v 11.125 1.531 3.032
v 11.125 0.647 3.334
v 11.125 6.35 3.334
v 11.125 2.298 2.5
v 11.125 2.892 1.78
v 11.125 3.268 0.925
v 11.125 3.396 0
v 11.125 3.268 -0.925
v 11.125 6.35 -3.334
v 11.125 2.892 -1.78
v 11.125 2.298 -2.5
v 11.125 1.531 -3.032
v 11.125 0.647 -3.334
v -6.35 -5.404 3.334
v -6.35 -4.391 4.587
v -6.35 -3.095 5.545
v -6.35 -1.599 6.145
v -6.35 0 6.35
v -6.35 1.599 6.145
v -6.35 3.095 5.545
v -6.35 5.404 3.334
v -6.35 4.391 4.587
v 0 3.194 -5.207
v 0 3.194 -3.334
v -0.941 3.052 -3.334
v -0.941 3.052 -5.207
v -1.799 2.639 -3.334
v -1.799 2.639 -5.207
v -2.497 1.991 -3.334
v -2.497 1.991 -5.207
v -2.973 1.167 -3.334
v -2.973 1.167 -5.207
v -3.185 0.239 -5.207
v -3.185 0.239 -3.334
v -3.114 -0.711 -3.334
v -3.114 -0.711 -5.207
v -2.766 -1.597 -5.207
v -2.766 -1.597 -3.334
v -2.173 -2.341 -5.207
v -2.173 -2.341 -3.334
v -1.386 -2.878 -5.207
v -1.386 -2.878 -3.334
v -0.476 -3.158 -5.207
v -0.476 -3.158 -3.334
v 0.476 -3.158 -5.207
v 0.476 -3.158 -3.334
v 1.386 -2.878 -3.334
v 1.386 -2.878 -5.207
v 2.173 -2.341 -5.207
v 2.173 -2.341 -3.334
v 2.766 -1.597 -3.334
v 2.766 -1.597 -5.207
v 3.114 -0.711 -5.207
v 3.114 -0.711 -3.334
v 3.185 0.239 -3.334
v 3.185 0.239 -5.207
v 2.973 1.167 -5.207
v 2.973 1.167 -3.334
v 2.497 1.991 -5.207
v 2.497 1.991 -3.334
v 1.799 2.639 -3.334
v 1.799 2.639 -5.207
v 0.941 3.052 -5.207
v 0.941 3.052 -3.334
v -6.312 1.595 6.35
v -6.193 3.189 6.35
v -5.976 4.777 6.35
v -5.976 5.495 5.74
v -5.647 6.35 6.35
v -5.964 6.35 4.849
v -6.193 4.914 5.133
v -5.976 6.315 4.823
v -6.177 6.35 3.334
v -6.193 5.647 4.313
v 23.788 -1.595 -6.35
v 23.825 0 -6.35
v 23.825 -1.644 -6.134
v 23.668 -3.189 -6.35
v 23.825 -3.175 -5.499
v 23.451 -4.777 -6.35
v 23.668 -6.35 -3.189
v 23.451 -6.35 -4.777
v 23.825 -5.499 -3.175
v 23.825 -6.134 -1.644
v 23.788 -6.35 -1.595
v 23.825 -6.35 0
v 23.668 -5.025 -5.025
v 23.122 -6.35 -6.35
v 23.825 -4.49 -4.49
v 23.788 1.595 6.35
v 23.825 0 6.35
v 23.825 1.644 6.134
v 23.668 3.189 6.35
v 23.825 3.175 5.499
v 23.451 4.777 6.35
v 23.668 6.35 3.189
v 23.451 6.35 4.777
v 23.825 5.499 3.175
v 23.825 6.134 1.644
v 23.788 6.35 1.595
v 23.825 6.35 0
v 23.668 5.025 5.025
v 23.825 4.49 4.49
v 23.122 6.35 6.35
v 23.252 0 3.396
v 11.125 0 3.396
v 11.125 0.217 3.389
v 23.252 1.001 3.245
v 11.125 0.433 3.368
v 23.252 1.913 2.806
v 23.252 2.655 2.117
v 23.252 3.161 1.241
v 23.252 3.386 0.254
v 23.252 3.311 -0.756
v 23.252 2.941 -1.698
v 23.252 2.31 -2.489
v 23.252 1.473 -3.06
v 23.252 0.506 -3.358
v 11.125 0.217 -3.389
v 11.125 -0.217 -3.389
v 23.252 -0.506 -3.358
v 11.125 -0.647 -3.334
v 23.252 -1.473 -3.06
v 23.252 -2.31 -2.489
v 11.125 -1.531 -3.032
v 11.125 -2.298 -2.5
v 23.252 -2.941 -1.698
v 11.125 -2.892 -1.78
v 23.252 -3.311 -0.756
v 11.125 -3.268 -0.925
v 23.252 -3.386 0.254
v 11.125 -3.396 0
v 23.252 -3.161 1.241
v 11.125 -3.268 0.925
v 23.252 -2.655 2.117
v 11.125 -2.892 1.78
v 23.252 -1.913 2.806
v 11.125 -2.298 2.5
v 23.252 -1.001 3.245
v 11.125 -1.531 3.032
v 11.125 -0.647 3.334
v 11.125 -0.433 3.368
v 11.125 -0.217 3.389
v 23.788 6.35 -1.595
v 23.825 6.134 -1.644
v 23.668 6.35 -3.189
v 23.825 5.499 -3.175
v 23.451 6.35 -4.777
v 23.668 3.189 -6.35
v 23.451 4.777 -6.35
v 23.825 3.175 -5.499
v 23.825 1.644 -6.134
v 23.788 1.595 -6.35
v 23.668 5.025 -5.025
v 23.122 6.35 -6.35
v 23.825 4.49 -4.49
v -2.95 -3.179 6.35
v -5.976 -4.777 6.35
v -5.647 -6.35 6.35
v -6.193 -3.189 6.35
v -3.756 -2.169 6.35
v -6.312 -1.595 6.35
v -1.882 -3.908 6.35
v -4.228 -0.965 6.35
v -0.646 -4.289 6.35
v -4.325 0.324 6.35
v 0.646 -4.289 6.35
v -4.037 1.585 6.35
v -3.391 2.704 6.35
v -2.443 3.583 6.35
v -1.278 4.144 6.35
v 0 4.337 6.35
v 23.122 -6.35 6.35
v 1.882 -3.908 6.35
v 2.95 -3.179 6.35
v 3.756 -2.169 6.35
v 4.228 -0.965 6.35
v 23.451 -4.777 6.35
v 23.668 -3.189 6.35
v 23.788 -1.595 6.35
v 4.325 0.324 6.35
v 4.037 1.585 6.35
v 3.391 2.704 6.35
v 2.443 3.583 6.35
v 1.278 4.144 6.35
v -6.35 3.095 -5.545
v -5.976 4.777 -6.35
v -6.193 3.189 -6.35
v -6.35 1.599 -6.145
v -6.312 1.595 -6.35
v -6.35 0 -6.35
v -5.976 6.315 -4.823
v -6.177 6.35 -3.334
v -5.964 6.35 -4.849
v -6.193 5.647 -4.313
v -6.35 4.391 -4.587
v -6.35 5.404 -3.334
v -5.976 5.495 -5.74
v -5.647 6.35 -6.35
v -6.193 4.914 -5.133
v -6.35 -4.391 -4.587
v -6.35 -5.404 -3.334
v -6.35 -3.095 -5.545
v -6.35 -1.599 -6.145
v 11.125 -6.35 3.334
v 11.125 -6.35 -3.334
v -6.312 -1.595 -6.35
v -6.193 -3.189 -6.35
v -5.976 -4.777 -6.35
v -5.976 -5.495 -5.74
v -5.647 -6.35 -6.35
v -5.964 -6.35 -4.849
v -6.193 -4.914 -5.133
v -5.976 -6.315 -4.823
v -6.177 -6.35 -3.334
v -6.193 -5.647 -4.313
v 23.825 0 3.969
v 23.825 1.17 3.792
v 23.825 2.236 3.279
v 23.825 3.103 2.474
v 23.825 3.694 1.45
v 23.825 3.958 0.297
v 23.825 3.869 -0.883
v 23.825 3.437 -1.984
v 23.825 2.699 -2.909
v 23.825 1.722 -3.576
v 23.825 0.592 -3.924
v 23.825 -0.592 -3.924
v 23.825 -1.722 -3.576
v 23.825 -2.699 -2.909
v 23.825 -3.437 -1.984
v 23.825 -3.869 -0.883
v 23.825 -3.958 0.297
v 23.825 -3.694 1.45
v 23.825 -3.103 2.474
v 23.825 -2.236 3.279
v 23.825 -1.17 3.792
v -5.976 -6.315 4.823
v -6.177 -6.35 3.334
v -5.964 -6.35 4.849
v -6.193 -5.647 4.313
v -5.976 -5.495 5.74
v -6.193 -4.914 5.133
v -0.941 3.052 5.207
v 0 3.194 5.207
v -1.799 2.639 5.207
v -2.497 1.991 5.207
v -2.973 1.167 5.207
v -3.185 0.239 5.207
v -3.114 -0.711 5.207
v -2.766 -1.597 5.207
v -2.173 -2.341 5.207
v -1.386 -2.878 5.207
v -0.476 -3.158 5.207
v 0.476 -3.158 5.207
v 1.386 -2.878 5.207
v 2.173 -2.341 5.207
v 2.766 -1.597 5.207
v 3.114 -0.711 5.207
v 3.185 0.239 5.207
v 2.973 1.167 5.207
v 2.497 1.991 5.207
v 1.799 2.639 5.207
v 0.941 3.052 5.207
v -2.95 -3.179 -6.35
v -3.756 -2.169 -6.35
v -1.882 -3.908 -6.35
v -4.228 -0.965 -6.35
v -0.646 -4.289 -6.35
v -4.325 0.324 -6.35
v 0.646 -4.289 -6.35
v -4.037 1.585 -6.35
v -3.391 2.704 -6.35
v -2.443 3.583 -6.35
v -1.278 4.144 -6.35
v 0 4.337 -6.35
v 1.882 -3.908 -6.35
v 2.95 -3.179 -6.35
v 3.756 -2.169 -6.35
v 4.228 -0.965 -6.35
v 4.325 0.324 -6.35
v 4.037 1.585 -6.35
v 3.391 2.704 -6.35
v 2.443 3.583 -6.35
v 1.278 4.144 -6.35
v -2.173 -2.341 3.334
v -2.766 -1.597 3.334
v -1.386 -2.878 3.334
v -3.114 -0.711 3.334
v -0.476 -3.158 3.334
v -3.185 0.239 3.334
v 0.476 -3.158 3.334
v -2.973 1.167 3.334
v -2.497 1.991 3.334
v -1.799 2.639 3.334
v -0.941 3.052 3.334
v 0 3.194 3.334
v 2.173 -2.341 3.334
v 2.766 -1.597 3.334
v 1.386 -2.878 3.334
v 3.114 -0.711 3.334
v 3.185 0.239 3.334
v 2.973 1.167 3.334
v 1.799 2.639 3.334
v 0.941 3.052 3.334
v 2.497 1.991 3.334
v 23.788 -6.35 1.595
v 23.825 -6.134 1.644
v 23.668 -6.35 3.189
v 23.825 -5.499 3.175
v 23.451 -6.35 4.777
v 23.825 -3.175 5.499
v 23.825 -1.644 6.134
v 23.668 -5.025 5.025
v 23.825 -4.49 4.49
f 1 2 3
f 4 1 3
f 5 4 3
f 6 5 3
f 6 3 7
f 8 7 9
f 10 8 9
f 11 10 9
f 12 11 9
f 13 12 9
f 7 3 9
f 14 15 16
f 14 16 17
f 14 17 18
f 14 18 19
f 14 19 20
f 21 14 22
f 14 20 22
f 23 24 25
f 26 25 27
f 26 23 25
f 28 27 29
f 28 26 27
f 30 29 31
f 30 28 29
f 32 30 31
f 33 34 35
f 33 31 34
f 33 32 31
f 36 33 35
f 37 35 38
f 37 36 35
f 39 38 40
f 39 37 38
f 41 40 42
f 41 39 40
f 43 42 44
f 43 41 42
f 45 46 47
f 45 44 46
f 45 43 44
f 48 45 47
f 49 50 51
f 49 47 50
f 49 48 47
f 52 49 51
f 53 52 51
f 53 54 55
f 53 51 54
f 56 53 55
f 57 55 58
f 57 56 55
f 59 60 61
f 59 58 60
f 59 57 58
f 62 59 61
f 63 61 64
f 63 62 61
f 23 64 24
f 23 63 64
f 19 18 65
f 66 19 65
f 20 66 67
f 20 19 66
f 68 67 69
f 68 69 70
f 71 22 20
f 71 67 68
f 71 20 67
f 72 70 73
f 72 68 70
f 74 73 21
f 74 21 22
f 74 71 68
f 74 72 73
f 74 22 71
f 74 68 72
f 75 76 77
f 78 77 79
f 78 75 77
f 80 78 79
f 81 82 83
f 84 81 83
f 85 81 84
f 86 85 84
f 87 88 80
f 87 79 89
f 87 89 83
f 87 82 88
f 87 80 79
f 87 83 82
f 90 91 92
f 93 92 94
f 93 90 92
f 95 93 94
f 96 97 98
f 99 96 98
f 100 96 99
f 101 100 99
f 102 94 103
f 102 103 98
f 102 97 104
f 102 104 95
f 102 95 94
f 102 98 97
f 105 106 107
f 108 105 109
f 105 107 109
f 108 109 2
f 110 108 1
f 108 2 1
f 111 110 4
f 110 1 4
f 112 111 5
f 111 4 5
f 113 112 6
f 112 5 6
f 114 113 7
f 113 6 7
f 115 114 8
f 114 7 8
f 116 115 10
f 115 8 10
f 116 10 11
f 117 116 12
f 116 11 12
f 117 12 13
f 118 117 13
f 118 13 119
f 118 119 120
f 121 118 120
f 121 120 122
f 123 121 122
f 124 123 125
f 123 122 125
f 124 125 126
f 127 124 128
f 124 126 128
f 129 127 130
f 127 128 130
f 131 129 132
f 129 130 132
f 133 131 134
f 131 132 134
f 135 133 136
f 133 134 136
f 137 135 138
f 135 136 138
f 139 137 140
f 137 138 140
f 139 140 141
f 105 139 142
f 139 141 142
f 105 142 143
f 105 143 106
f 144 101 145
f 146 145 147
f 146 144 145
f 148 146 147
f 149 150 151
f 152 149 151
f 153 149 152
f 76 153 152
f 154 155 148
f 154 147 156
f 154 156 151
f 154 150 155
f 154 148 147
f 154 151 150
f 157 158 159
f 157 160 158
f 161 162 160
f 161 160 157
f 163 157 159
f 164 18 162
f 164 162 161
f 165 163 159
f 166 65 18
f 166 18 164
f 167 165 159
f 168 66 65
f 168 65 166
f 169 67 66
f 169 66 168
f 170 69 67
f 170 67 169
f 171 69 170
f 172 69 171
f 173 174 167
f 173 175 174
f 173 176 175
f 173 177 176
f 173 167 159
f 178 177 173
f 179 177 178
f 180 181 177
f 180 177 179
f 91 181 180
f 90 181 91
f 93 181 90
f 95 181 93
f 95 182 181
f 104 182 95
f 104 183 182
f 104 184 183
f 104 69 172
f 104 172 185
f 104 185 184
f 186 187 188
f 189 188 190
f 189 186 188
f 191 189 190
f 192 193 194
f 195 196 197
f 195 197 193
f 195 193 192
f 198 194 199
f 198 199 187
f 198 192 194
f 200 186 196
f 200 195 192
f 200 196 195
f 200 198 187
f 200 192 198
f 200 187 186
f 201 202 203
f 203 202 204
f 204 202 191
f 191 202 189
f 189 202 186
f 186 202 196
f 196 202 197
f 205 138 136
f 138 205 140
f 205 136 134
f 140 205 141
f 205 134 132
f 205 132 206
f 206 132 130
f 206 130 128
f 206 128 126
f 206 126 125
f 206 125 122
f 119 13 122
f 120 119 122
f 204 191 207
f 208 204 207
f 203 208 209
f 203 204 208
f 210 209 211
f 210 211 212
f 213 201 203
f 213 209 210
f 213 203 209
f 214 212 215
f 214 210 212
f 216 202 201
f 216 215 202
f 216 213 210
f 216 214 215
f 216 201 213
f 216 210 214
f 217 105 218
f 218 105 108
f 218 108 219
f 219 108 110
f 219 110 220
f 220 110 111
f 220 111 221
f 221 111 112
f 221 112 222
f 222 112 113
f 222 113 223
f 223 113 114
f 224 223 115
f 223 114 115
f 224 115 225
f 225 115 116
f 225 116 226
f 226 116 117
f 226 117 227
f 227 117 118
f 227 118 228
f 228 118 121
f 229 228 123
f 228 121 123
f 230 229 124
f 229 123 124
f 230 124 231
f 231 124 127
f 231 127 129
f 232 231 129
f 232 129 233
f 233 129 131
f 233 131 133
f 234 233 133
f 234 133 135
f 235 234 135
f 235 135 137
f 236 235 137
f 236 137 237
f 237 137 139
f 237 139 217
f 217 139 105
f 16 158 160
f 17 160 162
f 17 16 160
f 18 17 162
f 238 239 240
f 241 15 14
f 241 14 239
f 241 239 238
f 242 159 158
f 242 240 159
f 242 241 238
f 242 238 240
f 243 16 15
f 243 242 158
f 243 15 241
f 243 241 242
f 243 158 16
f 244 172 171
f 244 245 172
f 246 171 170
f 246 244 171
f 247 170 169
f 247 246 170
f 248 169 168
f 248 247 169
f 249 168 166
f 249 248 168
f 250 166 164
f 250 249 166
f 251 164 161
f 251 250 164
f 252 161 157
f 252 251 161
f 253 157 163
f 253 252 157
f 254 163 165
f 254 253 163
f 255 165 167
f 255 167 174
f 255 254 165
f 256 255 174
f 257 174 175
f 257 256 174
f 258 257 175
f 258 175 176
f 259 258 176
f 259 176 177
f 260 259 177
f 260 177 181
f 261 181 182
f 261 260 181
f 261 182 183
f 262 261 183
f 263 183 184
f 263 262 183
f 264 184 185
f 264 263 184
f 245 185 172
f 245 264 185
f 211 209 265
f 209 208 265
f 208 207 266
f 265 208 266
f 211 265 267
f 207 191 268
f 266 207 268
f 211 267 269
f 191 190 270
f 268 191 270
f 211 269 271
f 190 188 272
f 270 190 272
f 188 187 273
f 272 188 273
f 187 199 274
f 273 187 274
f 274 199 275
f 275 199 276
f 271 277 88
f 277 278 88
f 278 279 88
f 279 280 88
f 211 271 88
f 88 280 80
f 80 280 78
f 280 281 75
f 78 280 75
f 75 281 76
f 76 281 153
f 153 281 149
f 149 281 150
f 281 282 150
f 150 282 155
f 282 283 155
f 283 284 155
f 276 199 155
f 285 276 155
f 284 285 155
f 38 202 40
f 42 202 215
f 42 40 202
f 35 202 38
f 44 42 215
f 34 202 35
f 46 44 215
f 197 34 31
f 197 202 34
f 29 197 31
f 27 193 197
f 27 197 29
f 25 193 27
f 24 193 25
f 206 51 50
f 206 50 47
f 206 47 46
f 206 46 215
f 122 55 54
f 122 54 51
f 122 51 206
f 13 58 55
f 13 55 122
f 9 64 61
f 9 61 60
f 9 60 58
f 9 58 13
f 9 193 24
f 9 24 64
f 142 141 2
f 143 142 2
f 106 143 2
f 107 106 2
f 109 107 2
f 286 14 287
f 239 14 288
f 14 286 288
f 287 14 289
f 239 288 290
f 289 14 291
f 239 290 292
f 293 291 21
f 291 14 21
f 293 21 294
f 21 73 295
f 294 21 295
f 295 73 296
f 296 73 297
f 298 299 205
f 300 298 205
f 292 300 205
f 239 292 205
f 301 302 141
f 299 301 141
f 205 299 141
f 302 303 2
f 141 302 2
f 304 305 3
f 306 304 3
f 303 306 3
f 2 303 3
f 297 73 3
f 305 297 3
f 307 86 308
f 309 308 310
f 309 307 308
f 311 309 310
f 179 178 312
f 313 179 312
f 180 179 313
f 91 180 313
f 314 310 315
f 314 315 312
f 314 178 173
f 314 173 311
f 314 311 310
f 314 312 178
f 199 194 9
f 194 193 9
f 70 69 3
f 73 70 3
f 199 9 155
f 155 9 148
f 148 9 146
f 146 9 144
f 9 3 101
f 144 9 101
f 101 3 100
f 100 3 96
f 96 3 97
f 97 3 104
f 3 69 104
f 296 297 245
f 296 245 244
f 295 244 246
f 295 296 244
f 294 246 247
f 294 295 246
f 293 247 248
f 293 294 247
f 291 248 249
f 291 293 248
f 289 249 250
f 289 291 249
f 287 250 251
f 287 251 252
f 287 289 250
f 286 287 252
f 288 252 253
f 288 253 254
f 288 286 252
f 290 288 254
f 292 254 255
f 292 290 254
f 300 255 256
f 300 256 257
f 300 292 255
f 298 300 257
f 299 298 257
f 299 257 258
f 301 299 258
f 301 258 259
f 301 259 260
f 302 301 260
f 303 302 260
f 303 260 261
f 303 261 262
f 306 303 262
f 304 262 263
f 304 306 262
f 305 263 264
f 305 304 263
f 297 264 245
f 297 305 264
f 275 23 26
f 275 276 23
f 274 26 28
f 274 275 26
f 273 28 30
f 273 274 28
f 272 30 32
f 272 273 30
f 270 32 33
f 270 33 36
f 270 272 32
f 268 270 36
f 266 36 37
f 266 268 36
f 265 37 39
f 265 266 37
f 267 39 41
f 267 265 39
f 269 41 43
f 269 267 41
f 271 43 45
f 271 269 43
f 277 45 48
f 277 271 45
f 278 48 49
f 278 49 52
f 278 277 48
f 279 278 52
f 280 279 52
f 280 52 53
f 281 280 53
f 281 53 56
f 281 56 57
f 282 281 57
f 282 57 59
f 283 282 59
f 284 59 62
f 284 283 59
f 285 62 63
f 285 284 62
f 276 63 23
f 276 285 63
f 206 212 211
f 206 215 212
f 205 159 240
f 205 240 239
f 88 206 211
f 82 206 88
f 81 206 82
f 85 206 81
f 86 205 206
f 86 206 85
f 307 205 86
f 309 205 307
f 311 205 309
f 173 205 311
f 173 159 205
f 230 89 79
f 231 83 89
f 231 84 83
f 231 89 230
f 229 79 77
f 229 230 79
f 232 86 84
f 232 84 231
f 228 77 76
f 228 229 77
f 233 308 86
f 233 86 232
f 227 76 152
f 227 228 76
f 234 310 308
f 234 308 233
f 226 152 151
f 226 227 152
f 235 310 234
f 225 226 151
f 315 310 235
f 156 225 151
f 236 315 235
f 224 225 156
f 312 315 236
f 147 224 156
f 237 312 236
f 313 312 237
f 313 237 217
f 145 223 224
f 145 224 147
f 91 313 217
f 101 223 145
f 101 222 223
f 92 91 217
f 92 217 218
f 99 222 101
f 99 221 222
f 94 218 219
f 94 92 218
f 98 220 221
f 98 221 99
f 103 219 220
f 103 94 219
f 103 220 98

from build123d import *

# Parameters (mm, degrees)
BOSS_EXTRUDE1_DEPTH      = 6.35
BOSS_EXTRUDE1_DEPTH_BACK = 6.35
SKETCH1_W                = 30.1752
SKETCH1_H                = 12.7
CUT_EXTRUDE1_DEPTH       = 6.35
CUT_EXTRUDE1_DEPTH_BACK  = 6.35
SKETCH2_W                = 17.4752
SKETCH2_H                = 6.6675
HOLE1_D                  = 6.79196
HOLE1_DEPTH              = 11.176
HOLE1_CSINK_D            = 7.9375
HOLE1_CSINK_ANGLE        = 90
HOLE2_D                  = 6.79196
HOLE2_DEPTH              = 1.524


with BuildPart() as part:
    # Sketch1 → Boss-Extrude1 (new, two sides: drawn at the far end of the back side and taken through both)
    with BuildSketch(Plane.XY.offset(-BOSS_EXTRUDE1_DEPTH_BACK)):
        with Locations((8.7376, 0)):
            Rectangle(SKETCH1_W, SKETCH1_H)
    extrude(amount=BOSS_EXTRUDE1_DEPTH + BOSS_EXTRUDE1_DEPTH_BACK)

    # Sketch2 → Cut-Extrude1 (cut, two sides: drawn at the far end of the back side and taken through both)
    with BuildSketch(Plane(origin=(0, 0, 0), x_dir=(1, 0, 0), z_dir=(0, 1, 0)).offset(-CUT_EXTRUDE1_DEPTH_BACK)):
        with Locations((2.3876, 0)):
            Rectangle(SKETCH2_W, SKETCH2_H)
    extrude(amount=CUT_EXTRUDE1_DEPTH + CUT_EXTRUDE1_DEPTH_BACK, mode=Mode.SUBTRACT)

    # Hole1
    with Locations(Plane(origin=(23.8252, 0, 0), x_dir=(0, 0, -1), z_dir=(1, 0, 0))):
        with Locations((0, 0)):
            CounterSinkHole(HOLE1_D / 2, HOLE1_CSINK_D / 2, depth=HOLE1_DEPTH, counter_sink_angle=HOLE1_CSINK_ANGLE)

    # Hole2
    with Locations(Plane(origin=(12.6492, 0, 0), x_dir=(0, 0, -1), z_dir=(1, 0, 0))):
        with Locations((0, 0)):
            Hole(HOLE2_D / 2, depth=HOLE2_DEPTH)

    # Sketch7 → Cut-Revolve1 (revolve, cut)
    with BuildSketch(Plane(origin=(0, 0, 0), x_dir=(0, 0, -1), z_dir=(1, 0, 0))):
        Polygon((-6.35, 0), (-6.35, 4.33705), (-5.207, 3.19405), (5.207, 3.19405), (6.35, 4.33705), (6.35, 0), align=None)
    revolve(axis=Axis((0, 0, -6.35), (0, 0, 1)), mode=Mode.SUBTRACT)

    # Sketch8 → Cut-Revolve2 (revolve, cut)
    with BuildSketch(Plane.XY):
        with BuildLine():
            Line((23.8252, 0), (23.8252, 6.35))
            ThreePointArc((23.8252, 6.35), (22.869586956, 9.650754782), (21.2852, 12.7))
            Line((21.2852, 12.7), (30.1752, 12.7))
            Line((30.1752, 12.7), (30.1752, 0))
            Line((30.1752, 0), (23.8252, 0))
        make_face()
    revolve(axis=Axis((30.1752, 0, 0), (-1, 0, 0)), mode=Mode.SUBTRACT)

    # Sketch9 → Cut-Revolve3 (revolve, cut)
    with BuildSketch(Plane.XY):
        with BuildLine():
            Line((-12.7, 0), (-12.7, 12.7))
            Line((-12.7, 12.7), (-3.81, 12.7))
            ThreePointArc((-3.81, 12.7), (-5.394386956, 9.650754782), (-6.35, 6.35))
            Line((-6.35, 6.35), (-6.35, 0))
            Line((-6.35, 0), (-12.7, 0))
        make_face()
    revolve(axis=Axis((-6.35, 0, 0), (-1, 0, 0)), mode=Mode.SUBTRACT)


solid = part.part
